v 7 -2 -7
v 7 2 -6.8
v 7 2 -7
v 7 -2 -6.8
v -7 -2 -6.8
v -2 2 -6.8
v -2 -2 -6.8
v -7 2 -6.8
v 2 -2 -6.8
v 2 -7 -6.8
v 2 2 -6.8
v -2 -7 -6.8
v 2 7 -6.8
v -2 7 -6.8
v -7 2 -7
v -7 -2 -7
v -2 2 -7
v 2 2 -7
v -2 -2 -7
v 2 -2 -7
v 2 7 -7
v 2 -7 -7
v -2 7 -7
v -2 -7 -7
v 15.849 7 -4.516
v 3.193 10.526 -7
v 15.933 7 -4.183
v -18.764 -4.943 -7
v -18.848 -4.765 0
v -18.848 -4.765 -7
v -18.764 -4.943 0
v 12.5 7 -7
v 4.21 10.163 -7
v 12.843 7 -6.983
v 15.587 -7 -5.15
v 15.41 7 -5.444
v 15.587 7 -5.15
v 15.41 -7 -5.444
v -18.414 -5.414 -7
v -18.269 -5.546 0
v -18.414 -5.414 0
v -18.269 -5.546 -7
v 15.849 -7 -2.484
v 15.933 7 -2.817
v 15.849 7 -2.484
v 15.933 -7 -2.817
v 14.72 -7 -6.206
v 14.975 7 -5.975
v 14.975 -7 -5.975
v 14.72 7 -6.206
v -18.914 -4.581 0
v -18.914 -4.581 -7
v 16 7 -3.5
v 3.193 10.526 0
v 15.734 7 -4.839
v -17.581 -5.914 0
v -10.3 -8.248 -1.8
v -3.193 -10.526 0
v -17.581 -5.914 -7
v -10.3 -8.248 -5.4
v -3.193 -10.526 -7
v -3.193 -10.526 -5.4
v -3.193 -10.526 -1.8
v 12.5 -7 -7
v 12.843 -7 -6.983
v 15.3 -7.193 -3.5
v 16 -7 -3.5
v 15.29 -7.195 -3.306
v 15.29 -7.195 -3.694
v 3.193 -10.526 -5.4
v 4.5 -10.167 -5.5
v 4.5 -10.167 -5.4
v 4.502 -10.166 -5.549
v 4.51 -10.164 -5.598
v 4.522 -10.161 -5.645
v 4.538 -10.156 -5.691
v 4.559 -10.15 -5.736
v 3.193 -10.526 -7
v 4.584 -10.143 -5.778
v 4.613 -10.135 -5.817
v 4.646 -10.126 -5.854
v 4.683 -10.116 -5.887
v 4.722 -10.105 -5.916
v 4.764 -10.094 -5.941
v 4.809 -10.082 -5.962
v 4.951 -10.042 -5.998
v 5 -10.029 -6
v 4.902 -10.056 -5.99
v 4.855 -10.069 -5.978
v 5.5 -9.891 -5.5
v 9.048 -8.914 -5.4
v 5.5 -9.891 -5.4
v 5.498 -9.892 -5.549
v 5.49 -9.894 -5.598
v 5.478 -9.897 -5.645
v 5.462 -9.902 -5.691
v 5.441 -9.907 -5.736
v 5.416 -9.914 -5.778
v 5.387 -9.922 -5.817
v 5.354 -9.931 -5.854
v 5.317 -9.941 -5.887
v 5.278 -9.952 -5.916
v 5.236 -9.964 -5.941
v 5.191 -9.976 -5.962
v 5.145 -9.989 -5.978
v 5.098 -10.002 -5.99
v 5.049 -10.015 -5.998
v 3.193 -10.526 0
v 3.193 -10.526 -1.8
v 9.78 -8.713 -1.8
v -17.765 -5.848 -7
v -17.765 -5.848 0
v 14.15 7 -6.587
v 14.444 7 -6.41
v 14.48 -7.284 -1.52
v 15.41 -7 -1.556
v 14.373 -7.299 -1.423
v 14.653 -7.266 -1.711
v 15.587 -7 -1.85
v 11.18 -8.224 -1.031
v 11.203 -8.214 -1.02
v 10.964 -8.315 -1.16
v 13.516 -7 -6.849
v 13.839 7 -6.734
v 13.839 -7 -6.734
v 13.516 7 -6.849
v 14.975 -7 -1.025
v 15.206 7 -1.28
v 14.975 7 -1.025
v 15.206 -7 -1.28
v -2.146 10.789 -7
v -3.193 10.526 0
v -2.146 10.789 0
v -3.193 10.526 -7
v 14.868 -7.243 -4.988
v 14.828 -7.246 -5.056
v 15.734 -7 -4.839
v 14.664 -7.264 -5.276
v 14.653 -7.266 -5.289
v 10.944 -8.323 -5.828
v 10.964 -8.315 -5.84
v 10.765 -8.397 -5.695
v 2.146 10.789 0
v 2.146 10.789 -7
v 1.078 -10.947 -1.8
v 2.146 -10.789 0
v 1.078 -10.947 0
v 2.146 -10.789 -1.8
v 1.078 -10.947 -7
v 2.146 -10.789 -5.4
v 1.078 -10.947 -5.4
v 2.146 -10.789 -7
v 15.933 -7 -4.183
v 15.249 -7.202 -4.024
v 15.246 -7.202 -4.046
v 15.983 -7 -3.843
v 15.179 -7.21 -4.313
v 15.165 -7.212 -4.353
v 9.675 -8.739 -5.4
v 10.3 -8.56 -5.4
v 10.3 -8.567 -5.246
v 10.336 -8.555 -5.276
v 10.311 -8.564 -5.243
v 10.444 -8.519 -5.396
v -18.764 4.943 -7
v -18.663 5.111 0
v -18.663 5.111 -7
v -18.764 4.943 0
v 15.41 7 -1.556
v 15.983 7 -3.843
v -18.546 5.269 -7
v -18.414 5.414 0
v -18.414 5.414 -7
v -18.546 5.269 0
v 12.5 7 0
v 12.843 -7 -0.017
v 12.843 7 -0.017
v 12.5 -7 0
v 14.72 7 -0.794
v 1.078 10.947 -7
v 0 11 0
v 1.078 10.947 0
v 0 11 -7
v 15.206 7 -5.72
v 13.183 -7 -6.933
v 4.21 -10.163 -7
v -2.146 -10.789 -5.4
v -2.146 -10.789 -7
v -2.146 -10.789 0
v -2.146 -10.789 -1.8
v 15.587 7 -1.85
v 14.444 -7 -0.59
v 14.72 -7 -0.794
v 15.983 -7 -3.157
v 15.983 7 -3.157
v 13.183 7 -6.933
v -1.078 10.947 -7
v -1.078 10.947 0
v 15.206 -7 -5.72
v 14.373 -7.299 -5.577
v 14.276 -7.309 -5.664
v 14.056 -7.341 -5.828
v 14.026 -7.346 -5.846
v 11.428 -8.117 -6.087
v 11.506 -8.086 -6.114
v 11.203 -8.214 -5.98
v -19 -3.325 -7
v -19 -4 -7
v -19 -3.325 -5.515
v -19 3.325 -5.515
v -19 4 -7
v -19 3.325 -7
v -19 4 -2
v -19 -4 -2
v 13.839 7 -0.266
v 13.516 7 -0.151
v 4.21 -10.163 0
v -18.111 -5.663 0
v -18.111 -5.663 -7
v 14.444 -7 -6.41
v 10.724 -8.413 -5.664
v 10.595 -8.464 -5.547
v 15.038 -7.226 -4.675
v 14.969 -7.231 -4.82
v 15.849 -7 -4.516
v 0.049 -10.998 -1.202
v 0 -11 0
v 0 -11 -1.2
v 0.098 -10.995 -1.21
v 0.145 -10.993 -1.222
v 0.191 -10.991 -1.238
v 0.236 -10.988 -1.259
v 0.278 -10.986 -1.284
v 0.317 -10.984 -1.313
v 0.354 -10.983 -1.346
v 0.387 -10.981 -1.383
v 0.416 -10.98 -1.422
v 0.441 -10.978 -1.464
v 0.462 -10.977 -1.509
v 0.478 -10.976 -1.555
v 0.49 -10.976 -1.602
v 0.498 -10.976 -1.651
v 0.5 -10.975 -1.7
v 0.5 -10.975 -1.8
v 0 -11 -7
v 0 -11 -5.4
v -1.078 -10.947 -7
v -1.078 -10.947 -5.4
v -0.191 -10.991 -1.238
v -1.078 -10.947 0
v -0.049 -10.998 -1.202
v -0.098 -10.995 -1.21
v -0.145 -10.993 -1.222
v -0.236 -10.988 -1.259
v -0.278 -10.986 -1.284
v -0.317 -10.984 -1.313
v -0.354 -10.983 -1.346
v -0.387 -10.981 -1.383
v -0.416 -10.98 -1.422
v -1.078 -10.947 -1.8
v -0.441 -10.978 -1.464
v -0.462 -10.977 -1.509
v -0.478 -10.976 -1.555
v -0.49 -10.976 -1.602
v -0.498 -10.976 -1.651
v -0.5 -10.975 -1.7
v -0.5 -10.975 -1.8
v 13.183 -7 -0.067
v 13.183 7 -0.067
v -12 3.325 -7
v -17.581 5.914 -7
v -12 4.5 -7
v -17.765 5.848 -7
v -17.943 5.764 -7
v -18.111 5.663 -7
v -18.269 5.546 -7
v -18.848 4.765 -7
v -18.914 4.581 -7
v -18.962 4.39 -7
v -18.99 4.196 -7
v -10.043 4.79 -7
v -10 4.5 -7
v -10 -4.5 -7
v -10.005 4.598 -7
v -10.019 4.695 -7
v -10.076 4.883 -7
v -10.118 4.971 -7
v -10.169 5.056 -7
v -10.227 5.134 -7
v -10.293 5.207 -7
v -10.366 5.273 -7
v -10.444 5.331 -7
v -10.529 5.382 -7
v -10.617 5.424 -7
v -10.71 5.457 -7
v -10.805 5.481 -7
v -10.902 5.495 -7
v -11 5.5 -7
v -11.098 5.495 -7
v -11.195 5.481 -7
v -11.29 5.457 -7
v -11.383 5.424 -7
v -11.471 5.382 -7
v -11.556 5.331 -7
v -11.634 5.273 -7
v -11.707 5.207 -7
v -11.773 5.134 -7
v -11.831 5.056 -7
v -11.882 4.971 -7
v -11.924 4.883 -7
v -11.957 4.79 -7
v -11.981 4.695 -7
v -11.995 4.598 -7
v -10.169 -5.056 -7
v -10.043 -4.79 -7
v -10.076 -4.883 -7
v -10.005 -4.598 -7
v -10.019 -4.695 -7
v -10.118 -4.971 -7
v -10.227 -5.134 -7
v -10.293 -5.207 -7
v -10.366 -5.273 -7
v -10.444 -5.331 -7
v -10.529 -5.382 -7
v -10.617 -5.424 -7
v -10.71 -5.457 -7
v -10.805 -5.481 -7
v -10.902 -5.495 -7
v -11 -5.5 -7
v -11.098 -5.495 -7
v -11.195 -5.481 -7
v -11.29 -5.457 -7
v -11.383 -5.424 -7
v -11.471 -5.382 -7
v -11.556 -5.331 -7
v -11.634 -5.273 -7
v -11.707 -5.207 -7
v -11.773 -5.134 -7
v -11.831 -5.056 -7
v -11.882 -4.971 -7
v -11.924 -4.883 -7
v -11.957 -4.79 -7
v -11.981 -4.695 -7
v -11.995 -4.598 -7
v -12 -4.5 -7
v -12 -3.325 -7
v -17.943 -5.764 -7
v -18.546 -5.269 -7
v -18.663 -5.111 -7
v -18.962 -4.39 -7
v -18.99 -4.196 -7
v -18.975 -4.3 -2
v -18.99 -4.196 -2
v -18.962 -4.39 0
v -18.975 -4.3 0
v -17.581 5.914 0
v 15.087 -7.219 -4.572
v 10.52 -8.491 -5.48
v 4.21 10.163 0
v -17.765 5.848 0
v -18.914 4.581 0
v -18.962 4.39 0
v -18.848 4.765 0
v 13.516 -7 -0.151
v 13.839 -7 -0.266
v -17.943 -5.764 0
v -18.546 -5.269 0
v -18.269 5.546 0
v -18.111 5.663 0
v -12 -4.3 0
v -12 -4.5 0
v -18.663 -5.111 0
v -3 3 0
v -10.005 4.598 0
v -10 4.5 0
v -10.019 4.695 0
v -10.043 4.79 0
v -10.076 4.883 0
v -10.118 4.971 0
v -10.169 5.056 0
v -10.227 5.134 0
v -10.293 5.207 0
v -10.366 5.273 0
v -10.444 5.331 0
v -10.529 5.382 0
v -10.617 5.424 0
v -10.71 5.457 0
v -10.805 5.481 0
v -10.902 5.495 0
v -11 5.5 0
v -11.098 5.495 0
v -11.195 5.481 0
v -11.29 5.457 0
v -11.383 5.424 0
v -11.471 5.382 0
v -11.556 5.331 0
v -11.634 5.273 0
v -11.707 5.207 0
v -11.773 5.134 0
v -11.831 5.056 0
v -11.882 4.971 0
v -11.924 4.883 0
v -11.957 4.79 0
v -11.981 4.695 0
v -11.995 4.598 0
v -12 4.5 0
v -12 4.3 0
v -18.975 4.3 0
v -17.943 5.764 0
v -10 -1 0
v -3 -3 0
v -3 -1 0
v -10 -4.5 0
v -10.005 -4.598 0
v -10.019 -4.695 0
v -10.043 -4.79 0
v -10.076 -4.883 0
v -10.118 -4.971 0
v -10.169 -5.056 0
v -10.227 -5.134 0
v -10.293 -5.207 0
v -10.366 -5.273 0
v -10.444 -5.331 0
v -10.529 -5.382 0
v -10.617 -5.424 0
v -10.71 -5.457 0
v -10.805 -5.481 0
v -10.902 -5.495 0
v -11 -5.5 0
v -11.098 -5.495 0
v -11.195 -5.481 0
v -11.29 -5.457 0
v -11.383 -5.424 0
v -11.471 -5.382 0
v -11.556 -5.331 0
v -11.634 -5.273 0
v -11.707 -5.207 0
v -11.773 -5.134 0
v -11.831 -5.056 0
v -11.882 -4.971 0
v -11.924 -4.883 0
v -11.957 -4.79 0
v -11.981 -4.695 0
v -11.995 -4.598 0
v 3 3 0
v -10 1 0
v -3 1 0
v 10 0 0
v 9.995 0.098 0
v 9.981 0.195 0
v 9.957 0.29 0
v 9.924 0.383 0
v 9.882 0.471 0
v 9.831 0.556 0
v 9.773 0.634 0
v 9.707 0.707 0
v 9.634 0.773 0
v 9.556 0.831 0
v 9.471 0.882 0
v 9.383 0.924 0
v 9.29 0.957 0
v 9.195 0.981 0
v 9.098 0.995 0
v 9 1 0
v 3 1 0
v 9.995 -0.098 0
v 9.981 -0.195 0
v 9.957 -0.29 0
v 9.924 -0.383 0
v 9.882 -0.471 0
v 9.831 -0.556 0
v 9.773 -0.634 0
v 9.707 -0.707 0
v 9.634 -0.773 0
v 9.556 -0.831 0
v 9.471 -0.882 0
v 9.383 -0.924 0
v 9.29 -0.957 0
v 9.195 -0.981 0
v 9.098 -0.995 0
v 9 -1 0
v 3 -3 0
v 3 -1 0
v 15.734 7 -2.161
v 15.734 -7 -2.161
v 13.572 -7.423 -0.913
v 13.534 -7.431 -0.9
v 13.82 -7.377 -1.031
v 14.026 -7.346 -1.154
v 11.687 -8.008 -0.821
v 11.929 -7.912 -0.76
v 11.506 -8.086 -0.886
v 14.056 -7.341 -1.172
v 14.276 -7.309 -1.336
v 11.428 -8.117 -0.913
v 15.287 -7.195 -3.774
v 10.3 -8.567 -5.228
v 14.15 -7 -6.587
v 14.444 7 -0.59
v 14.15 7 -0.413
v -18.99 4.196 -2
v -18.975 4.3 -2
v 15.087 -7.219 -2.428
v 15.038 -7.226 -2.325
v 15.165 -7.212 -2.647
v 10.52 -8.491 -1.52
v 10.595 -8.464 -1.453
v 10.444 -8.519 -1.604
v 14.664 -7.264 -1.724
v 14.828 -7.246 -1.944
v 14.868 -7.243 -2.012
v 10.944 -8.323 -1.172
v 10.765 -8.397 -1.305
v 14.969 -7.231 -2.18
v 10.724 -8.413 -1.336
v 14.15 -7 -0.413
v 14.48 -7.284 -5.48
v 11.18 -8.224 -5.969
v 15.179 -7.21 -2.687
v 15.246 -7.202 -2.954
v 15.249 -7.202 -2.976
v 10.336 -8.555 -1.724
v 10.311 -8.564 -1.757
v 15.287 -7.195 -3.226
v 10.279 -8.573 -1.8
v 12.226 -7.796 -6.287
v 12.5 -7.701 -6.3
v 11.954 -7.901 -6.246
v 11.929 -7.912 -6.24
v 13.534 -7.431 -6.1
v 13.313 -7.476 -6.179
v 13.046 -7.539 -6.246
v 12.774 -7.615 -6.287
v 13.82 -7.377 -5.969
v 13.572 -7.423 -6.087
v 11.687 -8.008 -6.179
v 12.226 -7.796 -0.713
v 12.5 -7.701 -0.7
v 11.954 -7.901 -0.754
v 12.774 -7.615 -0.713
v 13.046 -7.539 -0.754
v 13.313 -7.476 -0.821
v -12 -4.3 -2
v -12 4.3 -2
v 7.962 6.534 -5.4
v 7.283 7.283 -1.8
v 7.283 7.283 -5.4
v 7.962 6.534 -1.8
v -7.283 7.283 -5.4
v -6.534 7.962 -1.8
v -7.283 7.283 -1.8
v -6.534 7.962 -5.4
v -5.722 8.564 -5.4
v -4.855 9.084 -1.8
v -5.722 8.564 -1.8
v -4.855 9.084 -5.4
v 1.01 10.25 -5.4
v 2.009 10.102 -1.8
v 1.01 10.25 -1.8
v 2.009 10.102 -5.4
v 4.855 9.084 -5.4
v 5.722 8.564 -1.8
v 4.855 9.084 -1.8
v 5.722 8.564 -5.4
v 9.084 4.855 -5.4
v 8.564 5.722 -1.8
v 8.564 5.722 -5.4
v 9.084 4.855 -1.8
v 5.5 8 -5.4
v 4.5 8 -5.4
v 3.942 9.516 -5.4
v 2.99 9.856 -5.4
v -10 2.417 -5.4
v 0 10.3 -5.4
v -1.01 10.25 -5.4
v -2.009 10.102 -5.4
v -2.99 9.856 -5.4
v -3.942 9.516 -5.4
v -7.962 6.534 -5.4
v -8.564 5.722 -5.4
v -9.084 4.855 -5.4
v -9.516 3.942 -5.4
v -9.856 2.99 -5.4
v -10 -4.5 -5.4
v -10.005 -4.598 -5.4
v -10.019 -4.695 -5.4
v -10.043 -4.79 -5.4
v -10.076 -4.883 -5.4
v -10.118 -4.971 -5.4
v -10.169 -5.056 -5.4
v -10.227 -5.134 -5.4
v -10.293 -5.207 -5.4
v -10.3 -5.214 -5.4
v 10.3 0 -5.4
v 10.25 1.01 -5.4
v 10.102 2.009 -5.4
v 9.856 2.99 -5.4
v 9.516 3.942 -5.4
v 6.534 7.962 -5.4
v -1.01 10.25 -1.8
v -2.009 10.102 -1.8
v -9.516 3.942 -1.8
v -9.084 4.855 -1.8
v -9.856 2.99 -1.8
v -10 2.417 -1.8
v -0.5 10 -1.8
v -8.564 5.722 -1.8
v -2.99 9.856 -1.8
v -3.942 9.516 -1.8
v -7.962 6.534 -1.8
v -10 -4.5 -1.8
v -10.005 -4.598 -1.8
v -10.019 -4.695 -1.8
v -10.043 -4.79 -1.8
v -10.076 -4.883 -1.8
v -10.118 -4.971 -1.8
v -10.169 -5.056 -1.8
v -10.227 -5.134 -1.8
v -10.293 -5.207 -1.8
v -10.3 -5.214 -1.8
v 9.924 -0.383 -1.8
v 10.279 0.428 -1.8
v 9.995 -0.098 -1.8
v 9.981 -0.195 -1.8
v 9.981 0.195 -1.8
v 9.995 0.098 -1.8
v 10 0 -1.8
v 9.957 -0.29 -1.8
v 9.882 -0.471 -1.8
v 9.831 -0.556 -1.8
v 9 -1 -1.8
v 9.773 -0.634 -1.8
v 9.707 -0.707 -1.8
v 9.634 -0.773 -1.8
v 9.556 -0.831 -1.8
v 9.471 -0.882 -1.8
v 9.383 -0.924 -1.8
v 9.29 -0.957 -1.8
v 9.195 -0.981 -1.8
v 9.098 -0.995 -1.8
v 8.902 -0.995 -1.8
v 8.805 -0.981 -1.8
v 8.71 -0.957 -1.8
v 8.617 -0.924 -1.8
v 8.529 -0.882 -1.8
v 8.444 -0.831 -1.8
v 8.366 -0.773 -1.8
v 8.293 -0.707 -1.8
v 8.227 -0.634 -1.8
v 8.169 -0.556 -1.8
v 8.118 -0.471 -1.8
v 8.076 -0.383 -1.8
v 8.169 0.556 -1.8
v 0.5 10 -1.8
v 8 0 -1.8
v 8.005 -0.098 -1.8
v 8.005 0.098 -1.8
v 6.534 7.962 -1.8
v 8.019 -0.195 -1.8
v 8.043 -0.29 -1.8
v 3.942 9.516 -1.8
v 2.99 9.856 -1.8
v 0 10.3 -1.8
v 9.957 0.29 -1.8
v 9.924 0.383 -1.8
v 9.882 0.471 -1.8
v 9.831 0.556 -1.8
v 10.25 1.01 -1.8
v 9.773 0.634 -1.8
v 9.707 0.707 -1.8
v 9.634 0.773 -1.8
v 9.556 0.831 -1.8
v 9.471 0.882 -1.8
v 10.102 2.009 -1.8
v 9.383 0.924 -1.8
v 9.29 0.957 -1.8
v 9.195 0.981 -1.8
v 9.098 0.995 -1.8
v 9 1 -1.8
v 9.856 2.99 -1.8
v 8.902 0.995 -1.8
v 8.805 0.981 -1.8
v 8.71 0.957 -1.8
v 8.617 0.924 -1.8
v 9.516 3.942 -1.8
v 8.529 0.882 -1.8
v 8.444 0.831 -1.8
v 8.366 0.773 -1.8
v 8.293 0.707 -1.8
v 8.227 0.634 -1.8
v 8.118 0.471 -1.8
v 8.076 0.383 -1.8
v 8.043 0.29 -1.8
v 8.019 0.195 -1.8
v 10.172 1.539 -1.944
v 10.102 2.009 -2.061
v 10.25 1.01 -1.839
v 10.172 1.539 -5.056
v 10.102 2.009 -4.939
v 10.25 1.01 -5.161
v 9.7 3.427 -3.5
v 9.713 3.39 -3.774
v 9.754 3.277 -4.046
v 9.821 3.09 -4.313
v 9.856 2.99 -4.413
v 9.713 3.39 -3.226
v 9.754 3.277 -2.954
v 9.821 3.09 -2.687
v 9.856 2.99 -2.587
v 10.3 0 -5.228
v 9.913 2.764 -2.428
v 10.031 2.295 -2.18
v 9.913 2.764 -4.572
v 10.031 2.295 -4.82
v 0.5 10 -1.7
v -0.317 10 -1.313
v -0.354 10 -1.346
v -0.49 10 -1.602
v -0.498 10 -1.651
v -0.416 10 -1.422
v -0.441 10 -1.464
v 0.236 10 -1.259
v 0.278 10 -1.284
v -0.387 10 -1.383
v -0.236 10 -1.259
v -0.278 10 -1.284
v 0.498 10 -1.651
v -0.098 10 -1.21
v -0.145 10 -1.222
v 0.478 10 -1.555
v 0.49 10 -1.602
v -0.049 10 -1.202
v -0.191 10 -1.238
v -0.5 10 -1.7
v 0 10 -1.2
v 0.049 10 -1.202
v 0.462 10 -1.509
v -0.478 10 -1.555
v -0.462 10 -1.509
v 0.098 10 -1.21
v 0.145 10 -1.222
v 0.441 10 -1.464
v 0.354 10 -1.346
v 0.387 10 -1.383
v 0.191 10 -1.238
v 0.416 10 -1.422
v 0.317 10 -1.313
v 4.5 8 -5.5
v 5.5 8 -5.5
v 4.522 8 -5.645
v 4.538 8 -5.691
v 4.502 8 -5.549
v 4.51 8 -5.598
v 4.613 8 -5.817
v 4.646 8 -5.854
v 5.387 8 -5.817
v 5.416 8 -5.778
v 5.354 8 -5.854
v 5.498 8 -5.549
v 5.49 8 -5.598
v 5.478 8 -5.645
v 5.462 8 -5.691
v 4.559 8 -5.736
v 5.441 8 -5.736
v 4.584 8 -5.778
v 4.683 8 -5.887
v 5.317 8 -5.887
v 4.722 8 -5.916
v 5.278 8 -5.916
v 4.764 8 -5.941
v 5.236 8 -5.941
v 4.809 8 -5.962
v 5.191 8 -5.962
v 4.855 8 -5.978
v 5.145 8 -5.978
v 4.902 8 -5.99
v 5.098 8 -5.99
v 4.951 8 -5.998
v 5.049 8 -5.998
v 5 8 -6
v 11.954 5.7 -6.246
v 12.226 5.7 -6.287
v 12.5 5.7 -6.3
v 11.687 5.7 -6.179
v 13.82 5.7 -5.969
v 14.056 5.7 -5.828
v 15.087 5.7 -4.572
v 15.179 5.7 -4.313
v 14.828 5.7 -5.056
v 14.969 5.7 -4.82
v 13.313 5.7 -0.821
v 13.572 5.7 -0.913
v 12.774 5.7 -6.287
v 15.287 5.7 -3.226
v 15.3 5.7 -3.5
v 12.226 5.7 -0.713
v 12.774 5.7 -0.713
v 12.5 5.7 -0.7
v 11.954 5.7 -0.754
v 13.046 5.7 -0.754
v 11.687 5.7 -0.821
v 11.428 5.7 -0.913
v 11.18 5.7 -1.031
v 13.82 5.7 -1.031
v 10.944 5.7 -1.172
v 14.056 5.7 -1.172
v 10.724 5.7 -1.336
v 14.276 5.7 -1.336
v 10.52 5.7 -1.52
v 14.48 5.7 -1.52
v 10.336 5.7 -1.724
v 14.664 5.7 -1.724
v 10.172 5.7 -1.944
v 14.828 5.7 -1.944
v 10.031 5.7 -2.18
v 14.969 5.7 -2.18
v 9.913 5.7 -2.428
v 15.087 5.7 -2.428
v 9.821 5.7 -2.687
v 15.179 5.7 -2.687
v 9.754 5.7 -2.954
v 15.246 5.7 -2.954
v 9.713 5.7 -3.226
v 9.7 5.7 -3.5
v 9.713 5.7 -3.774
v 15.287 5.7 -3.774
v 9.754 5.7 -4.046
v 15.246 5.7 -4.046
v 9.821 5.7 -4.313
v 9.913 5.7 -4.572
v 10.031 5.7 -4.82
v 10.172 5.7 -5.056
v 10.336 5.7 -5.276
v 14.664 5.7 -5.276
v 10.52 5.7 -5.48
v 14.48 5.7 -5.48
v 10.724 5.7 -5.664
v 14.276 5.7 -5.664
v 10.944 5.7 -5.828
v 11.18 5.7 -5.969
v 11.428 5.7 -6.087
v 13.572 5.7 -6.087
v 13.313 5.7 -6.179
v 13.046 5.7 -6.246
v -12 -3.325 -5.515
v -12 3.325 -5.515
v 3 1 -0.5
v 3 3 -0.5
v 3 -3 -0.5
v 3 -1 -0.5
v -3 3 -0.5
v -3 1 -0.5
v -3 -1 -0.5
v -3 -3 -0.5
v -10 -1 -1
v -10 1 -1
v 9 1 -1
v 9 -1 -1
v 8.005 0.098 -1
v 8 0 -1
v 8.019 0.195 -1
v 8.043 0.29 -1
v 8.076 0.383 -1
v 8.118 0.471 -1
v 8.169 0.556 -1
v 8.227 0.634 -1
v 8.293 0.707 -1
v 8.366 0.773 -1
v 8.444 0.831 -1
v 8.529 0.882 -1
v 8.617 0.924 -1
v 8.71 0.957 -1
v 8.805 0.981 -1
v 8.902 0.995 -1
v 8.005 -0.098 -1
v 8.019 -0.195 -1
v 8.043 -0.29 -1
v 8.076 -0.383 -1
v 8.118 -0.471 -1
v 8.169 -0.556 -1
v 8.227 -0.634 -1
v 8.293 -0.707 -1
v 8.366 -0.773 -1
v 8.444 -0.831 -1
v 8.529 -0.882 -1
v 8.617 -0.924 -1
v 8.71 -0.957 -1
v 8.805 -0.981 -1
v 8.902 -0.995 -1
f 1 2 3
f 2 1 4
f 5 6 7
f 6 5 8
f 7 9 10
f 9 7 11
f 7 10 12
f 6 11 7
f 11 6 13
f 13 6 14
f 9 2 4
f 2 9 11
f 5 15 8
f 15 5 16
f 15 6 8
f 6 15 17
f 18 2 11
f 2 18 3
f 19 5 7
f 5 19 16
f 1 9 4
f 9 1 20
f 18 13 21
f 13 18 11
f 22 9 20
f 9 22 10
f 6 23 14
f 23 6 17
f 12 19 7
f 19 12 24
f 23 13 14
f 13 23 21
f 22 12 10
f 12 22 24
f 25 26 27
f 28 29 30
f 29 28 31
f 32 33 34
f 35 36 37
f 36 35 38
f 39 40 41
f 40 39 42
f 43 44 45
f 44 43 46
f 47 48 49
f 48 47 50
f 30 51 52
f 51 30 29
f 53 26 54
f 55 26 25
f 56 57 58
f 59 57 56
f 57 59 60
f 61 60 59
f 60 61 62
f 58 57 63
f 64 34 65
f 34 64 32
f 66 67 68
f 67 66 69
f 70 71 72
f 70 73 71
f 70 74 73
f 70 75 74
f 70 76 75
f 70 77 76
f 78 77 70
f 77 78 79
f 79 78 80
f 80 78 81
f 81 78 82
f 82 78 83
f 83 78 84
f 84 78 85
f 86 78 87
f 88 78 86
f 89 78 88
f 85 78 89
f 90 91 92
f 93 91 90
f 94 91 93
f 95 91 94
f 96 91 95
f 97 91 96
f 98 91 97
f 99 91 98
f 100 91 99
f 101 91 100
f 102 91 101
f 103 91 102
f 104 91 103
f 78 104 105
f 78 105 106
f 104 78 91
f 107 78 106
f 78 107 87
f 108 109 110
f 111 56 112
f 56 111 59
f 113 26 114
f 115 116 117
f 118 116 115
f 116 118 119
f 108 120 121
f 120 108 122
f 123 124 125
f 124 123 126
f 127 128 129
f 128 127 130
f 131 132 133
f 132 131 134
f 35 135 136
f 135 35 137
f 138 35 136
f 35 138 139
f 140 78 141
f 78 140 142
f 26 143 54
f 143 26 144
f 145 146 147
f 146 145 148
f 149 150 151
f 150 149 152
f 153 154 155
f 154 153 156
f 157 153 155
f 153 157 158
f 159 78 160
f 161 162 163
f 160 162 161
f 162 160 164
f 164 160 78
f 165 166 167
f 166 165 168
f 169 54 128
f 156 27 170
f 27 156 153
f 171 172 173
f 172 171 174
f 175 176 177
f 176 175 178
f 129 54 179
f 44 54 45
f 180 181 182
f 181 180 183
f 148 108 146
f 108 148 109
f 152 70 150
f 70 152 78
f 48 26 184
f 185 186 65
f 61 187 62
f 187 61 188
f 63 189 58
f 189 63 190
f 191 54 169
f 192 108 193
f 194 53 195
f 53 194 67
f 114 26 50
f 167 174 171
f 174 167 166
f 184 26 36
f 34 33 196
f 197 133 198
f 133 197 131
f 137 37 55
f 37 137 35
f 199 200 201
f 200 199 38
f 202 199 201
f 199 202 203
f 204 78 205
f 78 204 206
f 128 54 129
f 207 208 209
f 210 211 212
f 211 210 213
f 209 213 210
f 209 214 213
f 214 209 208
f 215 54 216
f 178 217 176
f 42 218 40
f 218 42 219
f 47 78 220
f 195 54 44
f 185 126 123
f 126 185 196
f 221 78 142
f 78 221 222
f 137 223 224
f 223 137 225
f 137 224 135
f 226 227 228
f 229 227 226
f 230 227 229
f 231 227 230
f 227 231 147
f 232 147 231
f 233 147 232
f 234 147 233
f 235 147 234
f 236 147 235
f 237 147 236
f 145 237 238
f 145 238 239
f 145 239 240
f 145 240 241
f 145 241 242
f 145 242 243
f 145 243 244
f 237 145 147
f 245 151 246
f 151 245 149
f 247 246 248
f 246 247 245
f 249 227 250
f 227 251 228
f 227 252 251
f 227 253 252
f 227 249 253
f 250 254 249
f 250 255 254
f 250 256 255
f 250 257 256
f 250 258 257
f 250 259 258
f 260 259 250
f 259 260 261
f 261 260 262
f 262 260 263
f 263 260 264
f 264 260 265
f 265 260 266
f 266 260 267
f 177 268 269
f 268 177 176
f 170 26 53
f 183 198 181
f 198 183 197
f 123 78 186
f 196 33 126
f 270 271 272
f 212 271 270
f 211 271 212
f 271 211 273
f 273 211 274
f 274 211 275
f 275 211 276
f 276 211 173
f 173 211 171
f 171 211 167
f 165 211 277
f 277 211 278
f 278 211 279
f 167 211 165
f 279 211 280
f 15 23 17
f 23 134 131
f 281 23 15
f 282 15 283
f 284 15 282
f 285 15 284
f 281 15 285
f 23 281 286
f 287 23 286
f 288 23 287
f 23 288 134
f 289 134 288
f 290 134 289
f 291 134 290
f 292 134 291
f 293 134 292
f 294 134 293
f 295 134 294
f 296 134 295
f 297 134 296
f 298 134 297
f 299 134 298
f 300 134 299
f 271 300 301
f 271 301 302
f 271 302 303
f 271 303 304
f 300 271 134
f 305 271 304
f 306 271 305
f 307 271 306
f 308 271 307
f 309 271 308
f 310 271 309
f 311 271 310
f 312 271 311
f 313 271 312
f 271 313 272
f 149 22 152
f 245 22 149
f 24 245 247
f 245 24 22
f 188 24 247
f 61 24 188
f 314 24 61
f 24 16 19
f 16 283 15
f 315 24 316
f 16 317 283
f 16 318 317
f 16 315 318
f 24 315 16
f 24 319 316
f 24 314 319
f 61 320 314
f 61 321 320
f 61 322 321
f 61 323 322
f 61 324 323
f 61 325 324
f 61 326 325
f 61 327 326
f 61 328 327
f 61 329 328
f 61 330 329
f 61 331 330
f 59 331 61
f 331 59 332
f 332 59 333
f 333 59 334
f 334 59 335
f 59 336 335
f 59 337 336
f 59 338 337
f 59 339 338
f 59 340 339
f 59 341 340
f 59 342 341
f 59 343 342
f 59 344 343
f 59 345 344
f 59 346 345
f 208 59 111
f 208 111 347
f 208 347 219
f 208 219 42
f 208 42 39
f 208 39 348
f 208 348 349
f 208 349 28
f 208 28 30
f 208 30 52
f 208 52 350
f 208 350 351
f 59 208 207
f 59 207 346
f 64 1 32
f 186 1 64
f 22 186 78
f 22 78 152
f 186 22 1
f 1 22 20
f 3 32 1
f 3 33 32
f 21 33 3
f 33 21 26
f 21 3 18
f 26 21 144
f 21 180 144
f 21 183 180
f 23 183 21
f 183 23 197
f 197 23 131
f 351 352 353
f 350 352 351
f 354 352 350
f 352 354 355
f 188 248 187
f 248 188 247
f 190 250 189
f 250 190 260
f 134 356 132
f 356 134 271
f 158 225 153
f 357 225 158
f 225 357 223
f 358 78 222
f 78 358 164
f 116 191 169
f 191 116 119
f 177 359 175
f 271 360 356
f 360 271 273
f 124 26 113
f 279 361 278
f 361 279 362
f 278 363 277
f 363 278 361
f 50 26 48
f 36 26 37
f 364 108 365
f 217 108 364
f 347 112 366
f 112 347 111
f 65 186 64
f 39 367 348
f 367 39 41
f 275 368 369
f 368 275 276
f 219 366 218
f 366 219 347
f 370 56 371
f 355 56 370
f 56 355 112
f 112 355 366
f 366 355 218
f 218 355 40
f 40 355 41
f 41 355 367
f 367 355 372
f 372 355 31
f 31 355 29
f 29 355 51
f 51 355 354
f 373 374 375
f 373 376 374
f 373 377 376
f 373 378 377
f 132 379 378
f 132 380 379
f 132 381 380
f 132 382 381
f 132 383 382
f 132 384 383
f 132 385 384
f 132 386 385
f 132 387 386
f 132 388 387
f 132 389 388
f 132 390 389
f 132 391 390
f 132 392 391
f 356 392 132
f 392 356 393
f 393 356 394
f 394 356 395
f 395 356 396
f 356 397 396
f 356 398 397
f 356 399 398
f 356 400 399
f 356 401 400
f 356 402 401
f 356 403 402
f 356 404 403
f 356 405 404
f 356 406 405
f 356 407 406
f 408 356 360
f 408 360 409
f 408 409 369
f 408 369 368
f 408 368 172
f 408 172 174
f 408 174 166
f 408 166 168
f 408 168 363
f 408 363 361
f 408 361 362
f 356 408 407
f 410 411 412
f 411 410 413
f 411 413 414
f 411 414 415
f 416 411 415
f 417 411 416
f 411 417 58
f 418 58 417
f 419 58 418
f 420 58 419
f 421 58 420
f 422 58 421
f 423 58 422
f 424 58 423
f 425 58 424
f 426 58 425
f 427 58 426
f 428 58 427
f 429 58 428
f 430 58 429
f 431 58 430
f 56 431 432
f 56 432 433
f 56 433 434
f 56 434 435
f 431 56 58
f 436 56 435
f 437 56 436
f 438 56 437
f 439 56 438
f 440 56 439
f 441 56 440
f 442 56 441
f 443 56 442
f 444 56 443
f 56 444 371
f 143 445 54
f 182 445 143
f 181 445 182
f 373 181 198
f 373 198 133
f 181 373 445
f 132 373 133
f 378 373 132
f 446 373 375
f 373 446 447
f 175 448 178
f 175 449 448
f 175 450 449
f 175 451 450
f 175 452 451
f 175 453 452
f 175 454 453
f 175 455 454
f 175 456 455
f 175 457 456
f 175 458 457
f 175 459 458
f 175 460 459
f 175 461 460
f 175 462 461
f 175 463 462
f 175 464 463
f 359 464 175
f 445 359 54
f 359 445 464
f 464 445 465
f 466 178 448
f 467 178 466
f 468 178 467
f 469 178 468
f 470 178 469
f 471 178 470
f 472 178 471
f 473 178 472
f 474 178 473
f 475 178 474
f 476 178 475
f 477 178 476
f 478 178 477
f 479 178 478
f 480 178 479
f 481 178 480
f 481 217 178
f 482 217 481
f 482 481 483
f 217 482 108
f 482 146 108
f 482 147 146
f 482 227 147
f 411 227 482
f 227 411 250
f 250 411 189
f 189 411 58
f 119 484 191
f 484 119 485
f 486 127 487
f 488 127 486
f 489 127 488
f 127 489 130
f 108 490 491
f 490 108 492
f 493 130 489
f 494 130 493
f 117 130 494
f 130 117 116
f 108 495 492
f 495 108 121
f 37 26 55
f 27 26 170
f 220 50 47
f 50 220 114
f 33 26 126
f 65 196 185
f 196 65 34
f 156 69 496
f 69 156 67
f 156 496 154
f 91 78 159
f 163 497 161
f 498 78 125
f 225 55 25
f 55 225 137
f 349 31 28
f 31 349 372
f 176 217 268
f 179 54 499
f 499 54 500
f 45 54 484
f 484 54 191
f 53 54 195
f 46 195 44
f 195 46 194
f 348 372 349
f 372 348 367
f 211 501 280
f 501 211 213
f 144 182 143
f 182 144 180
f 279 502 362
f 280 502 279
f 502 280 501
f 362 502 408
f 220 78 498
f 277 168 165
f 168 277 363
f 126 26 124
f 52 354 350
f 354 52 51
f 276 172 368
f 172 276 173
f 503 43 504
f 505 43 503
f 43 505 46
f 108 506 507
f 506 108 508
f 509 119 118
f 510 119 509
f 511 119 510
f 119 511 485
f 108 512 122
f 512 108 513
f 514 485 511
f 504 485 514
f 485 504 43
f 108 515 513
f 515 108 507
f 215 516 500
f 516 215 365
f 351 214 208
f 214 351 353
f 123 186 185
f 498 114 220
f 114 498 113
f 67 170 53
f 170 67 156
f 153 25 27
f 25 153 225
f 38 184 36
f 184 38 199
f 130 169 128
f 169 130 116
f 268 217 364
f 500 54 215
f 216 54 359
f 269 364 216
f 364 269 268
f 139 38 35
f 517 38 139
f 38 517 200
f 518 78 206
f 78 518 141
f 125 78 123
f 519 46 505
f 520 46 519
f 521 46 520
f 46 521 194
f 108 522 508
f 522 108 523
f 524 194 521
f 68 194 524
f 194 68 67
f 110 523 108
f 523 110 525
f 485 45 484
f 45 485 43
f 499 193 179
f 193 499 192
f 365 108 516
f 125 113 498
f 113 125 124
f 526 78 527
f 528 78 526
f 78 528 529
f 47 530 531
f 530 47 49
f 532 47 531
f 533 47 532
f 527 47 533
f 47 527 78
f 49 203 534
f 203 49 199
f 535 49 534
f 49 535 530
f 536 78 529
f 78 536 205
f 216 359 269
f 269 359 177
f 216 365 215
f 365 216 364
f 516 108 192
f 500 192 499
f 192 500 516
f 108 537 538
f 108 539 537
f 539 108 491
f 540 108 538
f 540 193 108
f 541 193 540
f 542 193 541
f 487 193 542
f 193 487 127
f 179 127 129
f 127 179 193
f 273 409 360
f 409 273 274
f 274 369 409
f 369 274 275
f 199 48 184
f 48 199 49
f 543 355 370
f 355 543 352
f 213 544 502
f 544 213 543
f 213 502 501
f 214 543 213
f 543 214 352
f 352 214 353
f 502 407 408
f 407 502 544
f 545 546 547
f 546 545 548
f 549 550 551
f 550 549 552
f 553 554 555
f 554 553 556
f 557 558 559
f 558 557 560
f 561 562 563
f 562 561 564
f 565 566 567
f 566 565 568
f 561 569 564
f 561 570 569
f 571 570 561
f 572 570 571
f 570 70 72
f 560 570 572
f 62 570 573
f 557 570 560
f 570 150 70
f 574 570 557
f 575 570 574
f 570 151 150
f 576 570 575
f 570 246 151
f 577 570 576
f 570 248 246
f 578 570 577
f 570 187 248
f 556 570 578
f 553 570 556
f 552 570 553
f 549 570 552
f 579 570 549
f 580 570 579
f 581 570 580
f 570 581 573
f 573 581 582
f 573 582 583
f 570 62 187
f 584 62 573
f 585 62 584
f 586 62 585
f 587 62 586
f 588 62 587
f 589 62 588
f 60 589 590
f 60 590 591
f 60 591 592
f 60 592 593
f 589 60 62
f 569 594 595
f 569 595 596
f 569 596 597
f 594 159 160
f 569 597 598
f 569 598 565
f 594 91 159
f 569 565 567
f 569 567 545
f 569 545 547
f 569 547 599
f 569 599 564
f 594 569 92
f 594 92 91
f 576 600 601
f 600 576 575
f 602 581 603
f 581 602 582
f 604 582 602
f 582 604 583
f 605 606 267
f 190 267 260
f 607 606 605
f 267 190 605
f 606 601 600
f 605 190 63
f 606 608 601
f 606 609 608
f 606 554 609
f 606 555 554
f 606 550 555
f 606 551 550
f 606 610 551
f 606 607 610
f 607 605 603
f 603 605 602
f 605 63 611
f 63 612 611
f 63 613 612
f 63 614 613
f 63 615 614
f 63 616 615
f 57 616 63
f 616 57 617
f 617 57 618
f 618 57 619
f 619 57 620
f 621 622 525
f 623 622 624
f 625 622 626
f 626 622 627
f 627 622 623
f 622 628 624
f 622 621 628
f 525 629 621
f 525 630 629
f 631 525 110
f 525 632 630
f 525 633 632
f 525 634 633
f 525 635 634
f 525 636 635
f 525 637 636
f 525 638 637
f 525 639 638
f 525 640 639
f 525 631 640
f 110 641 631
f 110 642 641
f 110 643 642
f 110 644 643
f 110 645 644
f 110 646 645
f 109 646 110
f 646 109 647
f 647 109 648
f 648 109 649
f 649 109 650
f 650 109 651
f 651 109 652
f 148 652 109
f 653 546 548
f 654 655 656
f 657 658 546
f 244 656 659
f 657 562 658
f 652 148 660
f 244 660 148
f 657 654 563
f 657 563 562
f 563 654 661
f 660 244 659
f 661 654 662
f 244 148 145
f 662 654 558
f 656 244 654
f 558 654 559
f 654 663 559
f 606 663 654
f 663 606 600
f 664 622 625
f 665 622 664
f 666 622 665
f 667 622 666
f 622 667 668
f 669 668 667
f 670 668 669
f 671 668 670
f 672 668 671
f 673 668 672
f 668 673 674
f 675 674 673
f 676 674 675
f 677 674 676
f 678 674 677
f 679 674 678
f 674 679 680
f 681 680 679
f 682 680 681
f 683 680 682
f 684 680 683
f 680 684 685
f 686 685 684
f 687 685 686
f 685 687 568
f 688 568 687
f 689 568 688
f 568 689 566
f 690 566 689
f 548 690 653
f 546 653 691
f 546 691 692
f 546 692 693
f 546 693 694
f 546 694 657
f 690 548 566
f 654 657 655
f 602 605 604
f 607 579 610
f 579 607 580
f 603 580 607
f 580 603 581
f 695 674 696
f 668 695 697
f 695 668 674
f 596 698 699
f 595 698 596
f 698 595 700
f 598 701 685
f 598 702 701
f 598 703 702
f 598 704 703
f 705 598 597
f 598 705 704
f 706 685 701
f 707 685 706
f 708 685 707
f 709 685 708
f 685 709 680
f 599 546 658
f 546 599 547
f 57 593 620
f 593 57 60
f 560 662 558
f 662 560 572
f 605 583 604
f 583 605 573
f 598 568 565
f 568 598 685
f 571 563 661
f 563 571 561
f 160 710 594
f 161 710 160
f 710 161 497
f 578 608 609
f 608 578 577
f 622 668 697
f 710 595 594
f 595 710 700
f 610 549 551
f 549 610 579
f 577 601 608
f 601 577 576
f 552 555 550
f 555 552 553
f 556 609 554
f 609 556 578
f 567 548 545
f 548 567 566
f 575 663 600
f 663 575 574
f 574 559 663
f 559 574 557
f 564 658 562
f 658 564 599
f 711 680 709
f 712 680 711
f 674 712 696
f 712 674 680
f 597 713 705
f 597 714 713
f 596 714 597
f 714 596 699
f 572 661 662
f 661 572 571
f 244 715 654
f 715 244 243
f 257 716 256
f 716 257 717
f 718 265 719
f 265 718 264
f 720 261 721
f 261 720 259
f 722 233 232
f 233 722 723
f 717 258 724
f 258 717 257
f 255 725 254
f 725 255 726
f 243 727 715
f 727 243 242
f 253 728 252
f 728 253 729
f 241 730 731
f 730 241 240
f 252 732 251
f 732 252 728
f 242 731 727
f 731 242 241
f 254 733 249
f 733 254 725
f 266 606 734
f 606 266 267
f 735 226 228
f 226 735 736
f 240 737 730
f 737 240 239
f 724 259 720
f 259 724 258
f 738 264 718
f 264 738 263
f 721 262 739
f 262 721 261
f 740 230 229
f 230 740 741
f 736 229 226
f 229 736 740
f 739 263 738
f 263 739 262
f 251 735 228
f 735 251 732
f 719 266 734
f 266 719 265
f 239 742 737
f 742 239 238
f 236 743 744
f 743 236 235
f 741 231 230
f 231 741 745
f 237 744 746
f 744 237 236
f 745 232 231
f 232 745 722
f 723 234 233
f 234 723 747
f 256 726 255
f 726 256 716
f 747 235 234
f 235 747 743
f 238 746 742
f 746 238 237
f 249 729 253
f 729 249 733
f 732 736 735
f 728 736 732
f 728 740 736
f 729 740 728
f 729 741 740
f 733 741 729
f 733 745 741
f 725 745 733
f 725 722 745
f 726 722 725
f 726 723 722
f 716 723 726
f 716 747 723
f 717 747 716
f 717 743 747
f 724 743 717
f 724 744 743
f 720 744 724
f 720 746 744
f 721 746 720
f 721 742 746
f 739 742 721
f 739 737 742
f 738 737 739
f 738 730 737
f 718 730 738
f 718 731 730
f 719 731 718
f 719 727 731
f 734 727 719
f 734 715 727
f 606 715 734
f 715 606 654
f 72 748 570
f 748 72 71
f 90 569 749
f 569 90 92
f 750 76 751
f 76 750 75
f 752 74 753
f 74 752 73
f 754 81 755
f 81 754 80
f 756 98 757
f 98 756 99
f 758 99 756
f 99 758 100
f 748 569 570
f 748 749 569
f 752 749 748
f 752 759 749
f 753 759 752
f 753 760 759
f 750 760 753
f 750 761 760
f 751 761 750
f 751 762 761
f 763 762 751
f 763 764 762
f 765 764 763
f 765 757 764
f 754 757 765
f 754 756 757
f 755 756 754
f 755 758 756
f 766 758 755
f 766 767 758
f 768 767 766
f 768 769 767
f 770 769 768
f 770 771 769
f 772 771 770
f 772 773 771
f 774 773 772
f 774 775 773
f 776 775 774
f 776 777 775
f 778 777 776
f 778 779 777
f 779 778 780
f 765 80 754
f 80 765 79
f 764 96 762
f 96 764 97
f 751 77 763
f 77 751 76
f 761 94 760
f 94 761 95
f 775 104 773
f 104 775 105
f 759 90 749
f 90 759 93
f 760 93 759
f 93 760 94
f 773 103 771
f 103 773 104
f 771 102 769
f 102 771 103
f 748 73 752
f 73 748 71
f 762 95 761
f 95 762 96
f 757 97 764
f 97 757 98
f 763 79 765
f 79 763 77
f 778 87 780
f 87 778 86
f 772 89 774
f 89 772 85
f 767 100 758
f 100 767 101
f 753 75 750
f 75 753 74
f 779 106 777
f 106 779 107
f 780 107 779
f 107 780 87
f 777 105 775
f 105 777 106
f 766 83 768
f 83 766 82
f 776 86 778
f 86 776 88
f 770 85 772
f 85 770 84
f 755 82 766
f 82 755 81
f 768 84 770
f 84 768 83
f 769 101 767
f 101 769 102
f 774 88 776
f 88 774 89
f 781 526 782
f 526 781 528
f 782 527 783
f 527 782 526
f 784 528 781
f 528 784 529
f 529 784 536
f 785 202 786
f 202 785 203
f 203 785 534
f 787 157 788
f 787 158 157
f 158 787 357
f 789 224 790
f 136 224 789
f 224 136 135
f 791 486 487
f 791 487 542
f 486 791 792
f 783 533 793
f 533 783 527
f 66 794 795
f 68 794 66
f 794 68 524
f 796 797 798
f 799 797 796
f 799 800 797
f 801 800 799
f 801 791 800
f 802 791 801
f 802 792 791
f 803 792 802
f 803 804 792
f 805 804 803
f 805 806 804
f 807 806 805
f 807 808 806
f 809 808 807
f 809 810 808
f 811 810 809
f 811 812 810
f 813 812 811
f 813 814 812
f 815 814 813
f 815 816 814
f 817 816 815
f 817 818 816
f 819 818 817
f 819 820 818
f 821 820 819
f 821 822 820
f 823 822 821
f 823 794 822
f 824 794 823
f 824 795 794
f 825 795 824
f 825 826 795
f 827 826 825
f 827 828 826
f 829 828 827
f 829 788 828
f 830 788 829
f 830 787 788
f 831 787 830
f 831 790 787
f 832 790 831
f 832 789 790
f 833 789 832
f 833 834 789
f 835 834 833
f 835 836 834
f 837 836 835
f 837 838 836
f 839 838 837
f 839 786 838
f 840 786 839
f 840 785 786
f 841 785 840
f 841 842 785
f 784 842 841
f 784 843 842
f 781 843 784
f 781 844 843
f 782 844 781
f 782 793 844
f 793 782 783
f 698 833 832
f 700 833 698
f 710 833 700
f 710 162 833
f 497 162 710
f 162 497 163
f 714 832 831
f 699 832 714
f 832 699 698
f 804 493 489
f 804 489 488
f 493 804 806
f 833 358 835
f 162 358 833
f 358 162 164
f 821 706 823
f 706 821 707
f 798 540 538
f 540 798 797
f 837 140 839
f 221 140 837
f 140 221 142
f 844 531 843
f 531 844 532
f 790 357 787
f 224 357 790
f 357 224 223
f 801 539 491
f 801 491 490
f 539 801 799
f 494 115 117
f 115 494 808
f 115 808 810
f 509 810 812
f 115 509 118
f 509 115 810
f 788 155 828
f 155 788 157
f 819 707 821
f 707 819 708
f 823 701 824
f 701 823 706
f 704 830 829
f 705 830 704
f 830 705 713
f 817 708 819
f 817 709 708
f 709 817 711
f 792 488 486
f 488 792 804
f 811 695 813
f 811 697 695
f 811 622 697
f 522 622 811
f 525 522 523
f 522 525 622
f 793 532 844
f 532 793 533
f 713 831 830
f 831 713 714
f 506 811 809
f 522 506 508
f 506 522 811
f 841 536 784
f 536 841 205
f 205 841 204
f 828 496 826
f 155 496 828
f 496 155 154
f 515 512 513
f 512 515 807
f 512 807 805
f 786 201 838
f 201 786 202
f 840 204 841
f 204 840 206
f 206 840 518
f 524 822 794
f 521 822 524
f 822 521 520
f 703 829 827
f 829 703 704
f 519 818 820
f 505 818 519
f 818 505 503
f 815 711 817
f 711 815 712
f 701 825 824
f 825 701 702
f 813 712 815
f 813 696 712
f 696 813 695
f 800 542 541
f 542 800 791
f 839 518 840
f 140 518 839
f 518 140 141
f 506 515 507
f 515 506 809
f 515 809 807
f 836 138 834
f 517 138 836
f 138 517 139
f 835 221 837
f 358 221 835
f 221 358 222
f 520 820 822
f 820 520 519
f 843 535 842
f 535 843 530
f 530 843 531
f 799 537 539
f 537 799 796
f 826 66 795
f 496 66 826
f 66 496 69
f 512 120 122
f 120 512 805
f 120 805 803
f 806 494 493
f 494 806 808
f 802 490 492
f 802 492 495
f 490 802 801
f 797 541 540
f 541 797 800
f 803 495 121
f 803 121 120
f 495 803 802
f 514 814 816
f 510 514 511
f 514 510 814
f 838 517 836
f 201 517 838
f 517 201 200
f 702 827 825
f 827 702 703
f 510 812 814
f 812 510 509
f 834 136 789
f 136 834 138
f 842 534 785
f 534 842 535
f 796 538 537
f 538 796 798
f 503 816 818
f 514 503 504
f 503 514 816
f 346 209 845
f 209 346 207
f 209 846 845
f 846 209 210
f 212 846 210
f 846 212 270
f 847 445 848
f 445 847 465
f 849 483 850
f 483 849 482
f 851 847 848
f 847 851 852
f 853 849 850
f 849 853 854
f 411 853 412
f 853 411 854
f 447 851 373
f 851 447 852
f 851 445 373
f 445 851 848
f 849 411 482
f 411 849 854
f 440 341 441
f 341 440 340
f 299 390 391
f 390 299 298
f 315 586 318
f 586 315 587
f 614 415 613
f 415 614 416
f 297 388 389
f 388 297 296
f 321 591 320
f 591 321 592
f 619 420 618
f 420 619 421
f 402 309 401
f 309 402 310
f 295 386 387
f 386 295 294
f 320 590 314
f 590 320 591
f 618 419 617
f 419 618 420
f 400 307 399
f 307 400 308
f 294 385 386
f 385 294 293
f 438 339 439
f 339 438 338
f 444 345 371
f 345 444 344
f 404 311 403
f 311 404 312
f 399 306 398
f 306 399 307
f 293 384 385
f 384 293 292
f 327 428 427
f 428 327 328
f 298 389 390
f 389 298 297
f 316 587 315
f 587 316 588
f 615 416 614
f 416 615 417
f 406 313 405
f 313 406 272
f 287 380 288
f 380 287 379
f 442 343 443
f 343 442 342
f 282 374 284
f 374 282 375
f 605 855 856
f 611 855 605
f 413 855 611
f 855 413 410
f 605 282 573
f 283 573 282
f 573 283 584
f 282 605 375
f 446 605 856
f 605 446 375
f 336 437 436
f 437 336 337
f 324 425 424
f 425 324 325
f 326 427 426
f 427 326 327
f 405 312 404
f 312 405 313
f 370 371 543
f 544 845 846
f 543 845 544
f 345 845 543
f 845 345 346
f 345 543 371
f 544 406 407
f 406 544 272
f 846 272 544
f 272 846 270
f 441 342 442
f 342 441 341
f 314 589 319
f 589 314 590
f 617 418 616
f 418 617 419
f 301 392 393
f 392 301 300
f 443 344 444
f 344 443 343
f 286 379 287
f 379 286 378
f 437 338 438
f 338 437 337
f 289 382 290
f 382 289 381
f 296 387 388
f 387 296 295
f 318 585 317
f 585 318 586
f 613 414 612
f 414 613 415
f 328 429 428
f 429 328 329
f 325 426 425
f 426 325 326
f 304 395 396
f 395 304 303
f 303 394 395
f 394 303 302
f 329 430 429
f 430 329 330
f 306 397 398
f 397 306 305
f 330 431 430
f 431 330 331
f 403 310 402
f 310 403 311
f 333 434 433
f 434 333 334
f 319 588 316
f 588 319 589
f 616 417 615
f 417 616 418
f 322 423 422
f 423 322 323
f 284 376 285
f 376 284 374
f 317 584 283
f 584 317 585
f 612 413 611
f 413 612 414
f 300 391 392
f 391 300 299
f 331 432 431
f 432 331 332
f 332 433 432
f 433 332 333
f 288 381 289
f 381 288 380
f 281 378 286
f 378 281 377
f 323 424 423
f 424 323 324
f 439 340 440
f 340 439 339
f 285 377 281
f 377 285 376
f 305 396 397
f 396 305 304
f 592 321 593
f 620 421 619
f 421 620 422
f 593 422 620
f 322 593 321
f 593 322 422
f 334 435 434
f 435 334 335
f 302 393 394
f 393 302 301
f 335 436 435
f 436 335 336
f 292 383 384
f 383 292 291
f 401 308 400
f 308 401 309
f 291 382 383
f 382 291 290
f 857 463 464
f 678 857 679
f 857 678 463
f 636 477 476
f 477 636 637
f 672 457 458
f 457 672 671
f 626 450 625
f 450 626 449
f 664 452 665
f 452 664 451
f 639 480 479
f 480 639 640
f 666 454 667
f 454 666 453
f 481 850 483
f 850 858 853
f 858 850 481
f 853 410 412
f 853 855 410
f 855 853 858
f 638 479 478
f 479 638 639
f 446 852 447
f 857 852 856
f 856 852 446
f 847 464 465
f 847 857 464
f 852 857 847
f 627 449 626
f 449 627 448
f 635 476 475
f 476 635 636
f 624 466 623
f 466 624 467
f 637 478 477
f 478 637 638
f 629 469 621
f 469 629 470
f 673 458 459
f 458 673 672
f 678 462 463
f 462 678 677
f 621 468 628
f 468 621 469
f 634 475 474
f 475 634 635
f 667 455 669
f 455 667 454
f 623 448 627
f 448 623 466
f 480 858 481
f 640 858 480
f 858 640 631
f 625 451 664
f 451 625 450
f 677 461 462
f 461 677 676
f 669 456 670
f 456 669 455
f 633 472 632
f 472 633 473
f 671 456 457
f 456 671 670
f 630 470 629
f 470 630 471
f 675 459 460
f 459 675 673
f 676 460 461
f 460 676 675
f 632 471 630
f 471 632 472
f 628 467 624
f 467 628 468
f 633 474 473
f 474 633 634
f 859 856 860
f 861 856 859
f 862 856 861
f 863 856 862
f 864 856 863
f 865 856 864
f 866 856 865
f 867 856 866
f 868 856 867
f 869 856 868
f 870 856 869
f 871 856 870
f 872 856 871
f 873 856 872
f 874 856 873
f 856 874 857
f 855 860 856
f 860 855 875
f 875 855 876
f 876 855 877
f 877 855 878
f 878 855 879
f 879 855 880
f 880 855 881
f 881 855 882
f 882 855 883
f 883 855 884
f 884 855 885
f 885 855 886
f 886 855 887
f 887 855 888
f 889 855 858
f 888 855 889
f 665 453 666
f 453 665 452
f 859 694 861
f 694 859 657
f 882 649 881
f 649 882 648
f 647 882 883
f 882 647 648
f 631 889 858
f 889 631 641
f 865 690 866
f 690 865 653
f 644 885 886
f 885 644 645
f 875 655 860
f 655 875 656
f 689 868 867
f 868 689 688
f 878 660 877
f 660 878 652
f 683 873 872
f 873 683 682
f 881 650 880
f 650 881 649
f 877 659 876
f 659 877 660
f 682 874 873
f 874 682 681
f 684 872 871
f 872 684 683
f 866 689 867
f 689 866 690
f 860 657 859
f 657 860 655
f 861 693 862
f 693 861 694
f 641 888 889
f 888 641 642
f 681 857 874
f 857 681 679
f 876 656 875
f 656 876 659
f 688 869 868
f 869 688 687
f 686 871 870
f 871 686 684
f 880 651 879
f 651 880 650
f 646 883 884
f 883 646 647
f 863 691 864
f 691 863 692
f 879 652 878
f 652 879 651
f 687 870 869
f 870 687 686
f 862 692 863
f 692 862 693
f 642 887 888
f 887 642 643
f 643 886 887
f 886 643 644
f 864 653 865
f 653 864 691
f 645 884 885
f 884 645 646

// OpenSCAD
// file: parts.scad
/**
* Martin Egli
* 2024-03-20
* a mockup for a SIP1907 (nRF52811) module with CR2032
*/
module origin(col = "Red", len = 10, loc_res = 4) {
    color(col)
    cylinder(d2 = .8, d1 = 0, h = len, $fn = loc_res);
}

module isp1907(loc_res = 32) {
    // MCU part, with connections, light part
    color("DarkGray")
    translate([-4, 0, 0])
    cube([8, 4, 1]);
    // antenna part
    color("Gray")
    translate([-4, -4, 0])
    cube([8, 4, 1]);
}

module isp1907_cut() {
    translate([-8.6/2, -8.6/2, 0])
    cube([8.6, 8.6, 3]);
}

module cr2032(loc_res = 32) {
    color("Silver") {
        cylinder(d = 17.7, h = 3.2, $fn = loc_res);
        cylinder(d = 20.0, h = 2.5, $fn = loc_res);
        translate([0, 0, 2.5])
        cylinder(d1 = 20.0, d2 = 19.0, h = 0.5, $fn = loc_res);
        // +
        translate([-5, -1, -0.1])
        cube([10, 2, 1]);
        translate([-1, -5, -0.1])
        cube([2, 10, 1]);
    }
}

module cr2032_cut(loc_res = 32) {
    cylinder(d = 20.6, h = 3.2+0.4, $fn = loc_res);
}

module tiltsensorRB231x2(show_origin = 1, loc_res = 32) {
    if(show_origin) {
        origin();
    }
    rotate([0, 90, 0]) 
    translate([-5/2, 0, -1]) {
        color("Silver") {
            hull() {
                translate([0, 0, 0])
                cylinder(d = 4, h = 11.4, $fn = loc_res);
                translate([0, 0, 11.4])
                cylinder(d1 = 4, d2 = 3, h = 1, $fn = loc_res);
            }
            translate([1, -2.5/2, 1])
            cube([4, 2.5, 0.5]);
        }
        color("Black")
        translate([0, 0, 0])
        cylinder(d = 5, h = 1, $fn = loc_res);
        color("Gold") {
        translate([-1, -0.8/2, -4.2])
        cube([10.7-5/2, 0.8, 0.8]);
        translate([-1, -0.8/2, -4.2])
        cube([0.8, 0.8, 5]);
        }
    }
}

module vibrasensorAdafruit2384(show_origin= 1, con_len = 12, loc_res = 32) {
    if(show_origin) {
        origin();
    }
    color("DarkBlue")
    translate([0, 0, 0])
    cylinder(d = 5, h = 11, $fn = loc_res);
    translate([-1.2, -0.4/2,  -con_len])
    cube([0.4, 0.4, con_len]);
    translate([+0.8, -0.4/2,  -con_len])
    cube([0.4, 0.4, con_len]);
}
module vibrasensorAdafruit2384_cut(loc_res = 32) {
    translate([0, 0, -4])
    cylinder(d = 5.6, h = 11+4, $fn = loc_res);
}

module swd50milHeader(loc_res = 32) {
    color("Silver")
    for(n = [0: 1: 4])
    translate([n*1.27, 0, -2])
    cylinder(d = 0.6, h = 4, $fn = loc_res);
    color("Black")
    translate([-1.27/2, -1.27/2, 0])
    cube([1.27*5, 1.27, 1.9]);
}

module swd50milHeader_cut() {
    translate([-1.27/2-0.15, -1.27/2-0.15, -(4-1.9)])
    cube([1.27*5+0.3, 1.27+0.3, 4.5]); // h = 1.9
}

module buttonPTS526(col = "Silver", loc_res = 32) {
// origin in the middle, at the bottom
    color(col) {
        hull() {
            translate([-3/2, -4.8/2, 0])
            cube([3, 4.8, 1]);
            translate([-4.8/2, -3/2, 0])
            cube([4.8, 3, 1]);
        }
        translate([0, 0, 0])
        cylinder(d =2, h = 1.5, $fn = loc_res);
    }
}
*buttonPTS526();

// origin: center
// detailed version
module led1206_detailed(col = "Red", loc_res = 32) {
    difference() {
        union() {
            color(col)
            translate([-2/2, -1.6/2, 0.3])
            cube([2, 1.6, 0.4]);
            color("White")
            translate([-3.2/2, -1.6/2, 0])
            cube([3.2, 1.6, 0.3]);
            translate([-3.25/2, -1.5/2, -0.01])
            cube([0.6, 1.5, 0.32]);
            translate([+(3.25/2-0.6), -1.5/2, -0.01])
            cube([0.6, 1.5, 0.32]);
        }
        translate([-3.2/2, 0, -0.2])
        cylinder(d = 0.4, h = 1, $fn = loc_res);
        translate([+3.2/2, 0, -0.2])
        cylinder(d = 0.4, h = 1, $fn = loc_res);
    }
}
// main file
/**
 * Martin Egli
 * 2024-03-20
 * buoy: sender on the wrist
 */
use <parts.scad>

module buoy(show_parts = 1, loc_res = 32) {
    // create buoy case
    difference() {
        hull() {
            translate([0, 0, -7])
            cylinder(d = 22, h = 7, $fn = loc_res);
            translate([+(20+5)/2, -14/2, -7/2])
            rotate([-90, 0, 0])
            cylinder(d = 7, h = 14, $fn = loc_res);
            translate([-17, -8/2, -7])
            cylinder(d = 4, h = 7, $fn = loc_res);
            translate([-17, +8/2, -7])
            cylinder(d = 4, h = 7, $fn = loc_res);
        }
    
        // cut out parts
        translate([-15, 0, -2])
        rotate([0, 0, 90])
        isp1907_cut();
        
        // CR2032
        hull() {
            translate([0, 0, -3.4-2])
            cr2032_cut(loc_res);
            translate([0, -12, -3.4-2])
            cr2032_cut(loc_res);
        }
        // battery contacts
        hull() {
            translate([0, -12, -1.7])
            rotate([-90, 0, 0])
            cylinder(d = 1, h = 22, $fn = loc_res);
            translate([0, -12, -1.7-1])
            rotate([-90, 0, 0])
            cylinder(d = 1, h = 22, $fn = loc_res);
        }
        hull() {
            translate([5, -12, -1.7-2])
            rotate([-90, 0, 0])
            cylinder(d = 1, h = 20, $fn = loc_res);
            translate([5, -12, -1.7-3.8])
            rotate([-90, 0, 0])
            cylinder(d = 1, h = 20, $fn = loc_res);
        }
        // + on bottom
        translate([0, 0, -(8-0.2)]) {
            translate([-14/2, -4/2, 0])
            cube([14, 4, 1]);
            translate([-4/2, -14/2, 0])
            cube([4, 14, 1]);
        }
        
        translate([+(20+5)/2, -11/2+0.2, -7/2])
        rotate([0, 90, 90])
        vibrasensorAdafruit2384_cut(loc_res);
        
        translate([-17, -(2*1.27), -6.3])
        rotate([-90, 0, 90])
        swd50milHeader_cut();
        
        translate([-14, -(2*1.27), -6.3])
        rotate([-90, 0, 90])
        swd50milHeader_cut();
        // cut buttonPTS526
        translate([-6/2, -6/2, -0.5])
        cube([6, 6, 2]);
        
        // cut outs for wires
        hull() {
            translate([-11, -9/2, -(7+1)])
            cylinder(d = 2, h = 7+2, $fn = loc_res);
            translate([-11, +9/2, -(7+1)])
            cylinder(d = 2, h = 7+2, $fn = loc_res);
        }
        hull() {
            translate([-11, 0, -1])
            cylinder(d = 2, h = 2, $fn = loc_res);
            translate([+9, 0, -1])
            cylinder(d = 2, h = 2, $fn = loc_res);
        }
        translate([+9, 0, -7/2])
        cylinder(d = 2, h = 4, $fn = loc_res);
    }
    
    // show components
    if(show_parts) {
        translate([-15, 0, -2])
        rotate([0, 0, 90])
        isp1907();

        translate([0, 0, -3.2-2])
        cr2032();

        translate([+(20+5)/2, -11/2, -7/2])
        rotate([0, 90, 90])
        vibrasensorAdafruit2384(con_len = 4);

        translate([-17, -(2*1.27), -6.3])
        rotate([-90, 0, 90])
        swd50milHeader();

        translate([0, 0, -0.5])
        buttonPTS526();
    }
}
buoy(0, 64); // print 1x
